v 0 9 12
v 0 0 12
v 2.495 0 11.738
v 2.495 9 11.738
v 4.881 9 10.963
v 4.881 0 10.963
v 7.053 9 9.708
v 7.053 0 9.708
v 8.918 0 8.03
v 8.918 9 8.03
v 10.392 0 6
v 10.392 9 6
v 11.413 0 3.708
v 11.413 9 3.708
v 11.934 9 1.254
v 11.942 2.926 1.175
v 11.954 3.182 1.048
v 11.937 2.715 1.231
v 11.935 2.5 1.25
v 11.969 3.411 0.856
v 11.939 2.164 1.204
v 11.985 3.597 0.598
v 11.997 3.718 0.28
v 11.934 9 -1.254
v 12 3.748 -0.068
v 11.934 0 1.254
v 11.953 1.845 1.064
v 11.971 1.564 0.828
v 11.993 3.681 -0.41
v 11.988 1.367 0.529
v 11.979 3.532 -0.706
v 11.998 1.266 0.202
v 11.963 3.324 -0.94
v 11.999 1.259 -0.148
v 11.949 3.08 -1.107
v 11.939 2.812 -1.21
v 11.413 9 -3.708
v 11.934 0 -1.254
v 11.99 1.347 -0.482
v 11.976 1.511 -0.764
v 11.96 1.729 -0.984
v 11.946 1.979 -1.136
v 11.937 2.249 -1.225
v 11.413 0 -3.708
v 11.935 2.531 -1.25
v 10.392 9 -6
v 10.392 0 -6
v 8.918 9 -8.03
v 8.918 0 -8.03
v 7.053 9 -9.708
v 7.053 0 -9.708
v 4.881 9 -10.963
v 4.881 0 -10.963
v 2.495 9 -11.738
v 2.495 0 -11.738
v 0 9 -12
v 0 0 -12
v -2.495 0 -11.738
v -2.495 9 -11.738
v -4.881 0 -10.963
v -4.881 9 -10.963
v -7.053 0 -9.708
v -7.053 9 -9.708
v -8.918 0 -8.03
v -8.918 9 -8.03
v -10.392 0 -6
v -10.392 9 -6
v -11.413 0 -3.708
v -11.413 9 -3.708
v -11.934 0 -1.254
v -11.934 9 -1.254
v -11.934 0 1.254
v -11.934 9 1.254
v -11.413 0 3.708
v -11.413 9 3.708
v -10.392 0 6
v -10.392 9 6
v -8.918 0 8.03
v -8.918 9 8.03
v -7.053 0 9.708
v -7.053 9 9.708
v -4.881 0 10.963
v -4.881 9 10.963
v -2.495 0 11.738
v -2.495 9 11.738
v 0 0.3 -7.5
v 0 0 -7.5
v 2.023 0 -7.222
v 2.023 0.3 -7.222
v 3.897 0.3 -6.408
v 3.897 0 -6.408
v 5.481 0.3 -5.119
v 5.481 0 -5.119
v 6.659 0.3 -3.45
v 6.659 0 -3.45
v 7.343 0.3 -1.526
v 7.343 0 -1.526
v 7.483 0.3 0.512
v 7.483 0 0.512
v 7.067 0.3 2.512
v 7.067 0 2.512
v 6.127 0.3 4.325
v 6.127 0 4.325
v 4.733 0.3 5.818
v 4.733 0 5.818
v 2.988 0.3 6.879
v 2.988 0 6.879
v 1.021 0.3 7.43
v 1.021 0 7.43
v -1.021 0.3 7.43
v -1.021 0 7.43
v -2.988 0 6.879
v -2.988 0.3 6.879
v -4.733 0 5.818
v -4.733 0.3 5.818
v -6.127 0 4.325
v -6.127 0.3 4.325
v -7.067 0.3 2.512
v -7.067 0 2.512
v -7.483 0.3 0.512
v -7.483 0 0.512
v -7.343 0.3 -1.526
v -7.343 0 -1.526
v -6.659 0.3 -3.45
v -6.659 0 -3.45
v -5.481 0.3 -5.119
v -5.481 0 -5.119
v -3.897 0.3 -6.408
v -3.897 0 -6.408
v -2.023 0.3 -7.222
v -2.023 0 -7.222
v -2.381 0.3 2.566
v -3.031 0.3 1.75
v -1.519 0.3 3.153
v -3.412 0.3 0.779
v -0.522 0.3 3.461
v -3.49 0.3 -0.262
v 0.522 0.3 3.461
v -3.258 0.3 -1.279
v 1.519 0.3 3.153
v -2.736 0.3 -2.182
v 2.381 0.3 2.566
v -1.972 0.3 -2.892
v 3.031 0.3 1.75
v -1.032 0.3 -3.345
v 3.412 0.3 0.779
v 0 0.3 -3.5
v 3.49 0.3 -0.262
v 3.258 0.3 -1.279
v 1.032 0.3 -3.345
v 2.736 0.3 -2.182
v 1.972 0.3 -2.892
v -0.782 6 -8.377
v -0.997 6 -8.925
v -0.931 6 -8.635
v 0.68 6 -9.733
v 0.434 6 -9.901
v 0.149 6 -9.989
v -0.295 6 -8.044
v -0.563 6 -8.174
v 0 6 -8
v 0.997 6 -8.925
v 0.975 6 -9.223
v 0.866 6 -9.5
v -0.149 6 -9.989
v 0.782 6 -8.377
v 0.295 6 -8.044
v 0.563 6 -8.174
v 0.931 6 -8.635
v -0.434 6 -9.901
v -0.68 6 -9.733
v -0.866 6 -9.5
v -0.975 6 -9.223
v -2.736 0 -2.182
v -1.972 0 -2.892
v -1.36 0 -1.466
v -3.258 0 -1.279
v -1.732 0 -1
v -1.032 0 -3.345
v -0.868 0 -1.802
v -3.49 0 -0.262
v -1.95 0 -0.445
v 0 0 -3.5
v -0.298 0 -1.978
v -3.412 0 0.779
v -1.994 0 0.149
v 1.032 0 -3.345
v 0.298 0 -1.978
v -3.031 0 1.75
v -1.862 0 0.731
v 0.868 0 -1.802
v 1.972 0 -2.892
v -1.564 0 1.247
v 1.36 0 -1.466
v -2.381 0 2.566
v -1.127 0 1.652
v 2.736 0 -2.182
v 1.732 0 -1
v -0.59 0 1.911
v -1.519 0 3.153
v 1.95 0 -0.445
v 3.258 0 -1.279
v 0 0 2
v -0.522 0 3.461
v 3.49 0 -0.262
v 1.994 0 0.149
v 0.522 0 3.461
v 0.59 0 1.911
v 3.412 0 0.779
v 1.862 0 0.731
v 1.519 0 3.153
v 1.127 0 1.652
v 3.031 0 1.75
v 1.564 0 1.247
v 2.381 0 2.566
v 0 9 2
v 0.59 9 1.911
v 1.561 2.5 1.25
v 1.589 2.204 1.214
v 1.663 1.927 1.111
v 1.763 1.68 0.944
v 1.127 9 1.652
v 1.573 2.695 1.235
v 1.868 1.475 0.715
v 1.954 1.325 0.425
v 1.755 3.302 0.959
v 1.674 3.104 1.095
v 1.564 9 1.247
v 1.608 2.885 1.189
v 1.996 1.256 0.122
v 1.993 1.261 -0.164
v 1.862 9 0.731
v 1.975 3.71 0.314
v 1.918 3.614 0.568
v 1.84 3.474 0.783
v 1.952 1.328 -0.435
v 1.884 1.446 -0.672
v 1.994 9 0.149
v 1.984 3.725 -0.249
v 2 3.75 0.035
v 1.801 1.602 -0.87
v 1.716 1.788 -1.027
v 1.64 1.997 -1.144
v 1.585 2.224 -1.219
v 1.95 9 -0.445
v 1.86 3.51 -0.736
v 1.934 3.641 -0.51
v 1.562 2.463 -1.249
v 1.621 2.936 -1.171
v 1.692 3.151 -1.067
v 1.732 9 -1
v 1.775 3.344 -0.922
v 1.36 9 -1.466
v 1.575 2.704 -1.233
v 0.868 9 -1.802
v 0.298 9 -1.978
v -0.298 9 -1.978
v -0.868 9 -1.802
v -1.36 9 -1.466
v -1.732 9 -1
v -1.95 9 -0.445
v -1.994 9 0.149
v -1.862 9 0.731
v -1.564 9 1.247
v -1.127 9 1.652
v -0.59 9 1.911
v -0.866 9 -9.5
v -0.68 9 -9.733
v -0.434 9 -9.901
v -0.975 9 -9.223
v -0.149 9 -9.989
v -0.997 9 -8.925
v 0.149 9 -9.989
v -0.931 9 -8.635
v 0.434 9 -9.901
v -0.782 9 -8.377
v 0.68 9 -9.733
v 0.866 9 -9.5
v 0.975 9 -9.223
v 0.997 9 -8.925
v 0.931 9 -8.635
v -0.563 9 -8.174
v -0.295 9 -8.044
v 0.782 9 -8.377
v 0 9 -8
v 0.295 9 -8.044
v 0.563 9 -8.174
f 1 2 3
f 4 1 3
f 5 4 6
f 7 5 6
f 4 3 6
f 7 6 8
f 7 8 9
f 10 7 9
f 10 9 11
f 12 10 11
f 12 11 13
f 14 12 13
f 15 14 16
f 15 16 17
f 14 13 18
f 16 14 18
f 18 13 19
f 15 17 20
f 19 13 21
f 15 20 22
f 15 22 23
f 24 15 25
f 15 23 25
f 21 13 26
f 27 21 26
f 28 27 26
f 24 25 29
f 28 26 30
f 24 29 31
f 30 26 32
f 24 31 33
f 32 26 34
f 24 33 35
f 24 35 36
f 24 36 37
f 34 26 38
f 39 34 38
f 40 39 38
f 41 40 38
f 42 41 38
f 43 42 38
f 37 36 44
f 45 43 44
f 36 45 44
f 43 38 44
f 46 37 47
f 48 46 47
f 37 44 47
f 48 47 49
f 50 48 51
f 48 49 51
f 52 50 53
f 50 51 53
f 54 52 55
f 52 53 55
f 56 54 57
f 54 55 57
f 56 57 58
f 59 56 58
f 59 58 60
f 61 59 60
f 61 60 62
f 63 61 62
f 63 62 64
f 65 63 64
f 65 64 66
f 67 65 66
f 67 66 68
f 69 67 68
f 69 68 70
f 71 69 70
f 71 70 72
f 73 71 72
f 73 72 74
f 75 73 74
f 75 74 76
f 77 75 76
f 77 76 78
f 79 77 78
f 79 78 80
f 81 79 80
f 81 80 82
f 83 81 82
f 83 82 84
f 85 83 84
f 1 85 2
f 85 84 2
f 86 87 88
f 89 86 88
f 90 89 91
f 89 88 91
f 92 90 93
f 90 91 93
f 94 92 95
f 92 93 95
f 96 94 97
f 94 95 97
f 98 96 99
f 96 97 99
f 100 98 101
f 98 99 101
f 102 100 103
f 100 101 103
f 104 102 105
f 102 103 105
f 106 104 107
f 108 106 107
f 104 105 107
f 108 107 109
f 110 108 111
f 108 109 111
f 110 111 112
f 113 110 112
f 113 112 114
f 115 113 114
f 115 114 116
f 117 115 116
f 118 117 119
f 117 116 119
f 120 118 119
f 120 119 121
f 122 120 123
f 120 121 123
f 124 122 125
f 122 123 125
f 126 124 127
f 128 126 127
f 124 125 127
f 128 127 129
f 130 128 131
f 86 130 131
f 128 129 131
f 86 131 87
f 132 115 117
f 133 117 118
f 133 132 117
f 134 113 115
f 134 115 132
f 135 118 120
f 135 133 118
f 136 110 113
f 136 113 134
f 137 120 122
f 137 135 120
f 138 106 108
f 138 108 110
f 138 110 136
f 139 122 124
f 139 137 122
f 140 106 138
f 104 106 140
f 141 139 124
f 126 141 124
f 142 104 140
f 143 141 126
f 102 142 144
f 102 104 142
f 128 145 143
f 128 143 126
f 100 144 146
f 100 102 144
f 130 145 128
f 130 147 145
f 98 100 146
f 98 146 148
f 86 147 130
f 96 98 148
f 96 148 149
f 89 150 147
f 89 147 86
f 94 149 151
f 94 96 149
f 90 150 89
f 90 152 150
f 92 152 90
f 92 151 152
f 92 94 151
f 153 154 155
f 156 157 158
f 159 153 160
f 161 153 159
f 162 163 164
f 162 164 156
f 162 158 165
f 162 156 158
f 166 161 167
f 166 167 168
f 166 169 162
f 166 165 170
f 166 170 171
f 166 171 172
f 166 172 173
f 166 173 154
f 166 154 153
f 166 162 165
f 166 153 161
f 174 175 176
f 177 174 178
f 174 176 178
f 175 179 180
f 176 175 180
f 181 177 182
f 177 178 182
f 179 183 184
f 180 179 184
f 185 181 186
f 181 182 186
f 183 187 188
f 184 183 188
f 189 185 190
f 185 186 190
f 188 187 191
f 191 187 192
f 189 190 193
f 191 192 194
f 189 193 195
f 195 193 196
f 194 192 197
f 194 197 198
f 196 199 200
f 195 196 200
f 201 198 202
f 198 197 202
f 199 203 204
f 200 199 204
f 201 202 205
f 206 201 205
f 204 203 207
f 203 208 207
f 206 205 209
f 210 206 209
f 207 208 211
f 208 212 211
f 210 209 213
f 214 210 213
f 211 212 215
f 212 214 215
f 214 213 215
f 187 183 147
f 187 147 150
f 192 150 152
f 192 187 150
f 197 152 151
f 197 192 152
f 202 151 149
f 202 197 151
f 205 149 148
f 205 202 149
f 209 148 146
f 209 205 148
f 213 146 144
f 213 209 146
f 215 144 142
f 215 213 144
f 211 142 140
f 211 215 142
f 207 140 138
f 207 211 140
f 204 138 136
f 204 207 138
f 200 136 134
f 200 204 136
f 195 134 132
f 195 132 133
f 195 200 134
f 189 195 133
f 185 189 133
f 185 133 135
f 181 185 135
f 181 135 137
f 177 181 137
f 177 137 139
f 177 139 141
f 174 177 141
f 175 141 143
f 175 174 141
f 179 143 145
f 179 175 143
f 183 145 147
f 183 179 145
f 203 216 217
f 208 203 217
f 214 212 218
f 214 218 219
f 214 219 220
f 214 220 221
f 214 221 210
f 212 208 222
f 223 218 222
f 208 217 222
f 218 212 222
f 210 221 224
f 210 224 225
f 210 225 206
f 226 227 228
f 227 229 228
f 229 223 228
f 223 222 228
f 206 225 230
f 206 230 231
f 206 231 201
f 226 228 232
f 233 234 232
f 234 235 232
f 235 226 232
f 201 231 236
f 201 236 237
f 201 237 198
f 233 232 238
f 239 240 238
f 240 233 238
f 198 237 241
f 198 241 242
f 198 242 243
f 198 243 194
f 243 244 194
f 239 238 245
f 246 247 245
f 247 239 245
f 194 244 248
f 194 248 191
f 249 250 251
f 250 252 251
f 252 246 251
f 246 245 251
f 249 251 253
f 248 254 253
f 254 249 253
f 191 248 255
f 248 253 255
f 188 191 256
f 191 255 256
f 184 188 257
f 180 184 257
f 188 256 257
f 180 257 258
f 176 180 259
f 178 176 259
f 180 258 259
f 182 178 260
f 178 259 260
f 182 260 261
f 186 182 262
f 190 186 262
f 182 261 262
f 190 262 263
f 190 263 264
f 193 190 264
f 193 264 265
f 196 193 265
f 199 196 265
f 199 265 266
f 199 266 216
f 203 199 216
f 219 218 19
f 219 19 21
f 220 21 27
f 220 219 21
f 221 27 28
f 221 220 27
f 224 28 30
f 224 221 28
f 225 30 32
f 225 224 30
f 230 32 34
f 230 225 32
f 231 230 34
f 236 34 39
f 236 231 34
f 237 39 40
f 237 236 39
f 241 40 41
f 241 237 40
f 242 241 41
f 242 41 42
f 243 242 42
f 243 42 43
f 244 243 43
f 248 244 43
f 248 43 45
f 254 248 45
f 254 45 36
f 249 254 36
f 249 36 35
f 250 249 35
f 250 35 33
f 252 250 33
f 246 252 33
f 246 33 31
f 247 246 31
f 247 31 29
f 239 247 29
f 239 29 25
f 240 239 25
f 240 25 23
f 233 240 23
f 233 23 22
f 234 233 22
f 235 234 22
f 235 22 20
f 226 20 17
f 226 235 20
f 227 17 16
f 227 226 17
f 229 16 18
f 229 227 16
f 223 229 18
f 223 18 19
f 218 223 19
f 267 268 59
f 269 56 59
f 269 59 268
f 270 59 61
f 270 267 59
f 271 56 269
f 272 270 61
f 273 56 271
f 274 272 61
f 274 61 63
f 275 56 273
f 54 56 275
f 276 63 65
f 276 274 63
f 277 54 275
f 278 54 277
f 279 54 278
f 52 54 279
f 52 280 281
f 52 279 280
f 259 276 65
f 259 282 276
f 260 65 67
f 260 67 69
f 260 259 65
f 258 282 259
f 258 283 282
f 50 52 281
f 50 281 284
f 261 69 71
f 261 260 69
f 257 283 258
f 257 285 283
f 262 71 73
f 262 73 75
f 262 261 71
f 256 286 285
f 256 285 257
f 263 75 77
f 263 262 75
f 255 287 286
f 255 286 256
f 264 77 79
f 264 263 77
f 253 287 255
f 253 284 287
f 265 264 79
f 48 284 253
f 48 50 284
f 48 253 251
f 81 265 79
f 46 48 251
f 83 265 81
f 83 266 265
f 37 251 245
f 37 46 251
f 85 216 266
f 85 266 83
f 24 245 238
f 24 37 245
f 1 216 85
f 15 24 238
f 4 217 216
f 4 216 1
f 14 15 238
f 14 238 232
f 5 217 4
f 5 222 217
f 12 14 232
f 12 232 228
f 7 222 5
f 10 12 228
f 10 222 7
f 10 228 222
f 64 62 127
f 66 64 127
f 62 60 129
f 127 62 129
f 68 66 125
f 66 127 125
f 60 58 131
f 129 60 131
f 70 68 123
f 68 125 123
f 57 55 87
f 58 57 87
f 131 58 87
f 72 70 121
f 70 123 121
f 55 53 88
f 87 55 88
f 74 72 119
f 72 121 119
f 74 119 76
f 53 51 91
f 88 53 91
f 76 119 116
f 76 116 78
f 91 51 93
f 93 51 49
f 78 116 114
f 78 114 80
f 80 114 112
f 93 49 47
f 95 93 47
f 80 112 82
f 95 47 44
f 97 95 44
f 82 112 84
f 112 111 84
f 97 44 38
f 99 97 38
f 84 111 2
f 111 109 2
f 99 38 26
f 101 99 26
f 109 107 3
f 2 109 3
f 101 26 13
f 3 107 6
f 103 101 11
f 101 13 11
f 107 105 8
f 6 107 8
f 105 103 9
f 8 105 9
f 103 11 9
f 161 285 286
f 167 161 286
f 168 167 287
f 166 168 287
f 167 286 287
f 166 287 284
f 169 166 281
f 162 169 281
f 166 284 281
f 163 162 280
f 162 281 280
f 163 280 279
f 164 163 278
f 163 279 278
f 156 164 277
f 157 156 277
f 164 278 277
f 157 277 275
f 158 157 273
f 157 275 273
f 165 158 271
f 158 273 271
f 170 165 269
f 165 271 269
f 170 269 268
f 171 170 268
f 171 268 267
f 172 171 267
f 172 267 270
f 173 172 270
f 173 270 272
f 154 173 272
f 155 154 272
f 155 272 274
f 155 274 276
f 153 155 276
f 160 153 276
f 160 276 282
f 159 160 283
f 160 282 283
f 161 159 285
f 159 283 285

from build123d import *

# Parameters (mm, degrees)
SKETCH_1_R          = 12
EXTRUDE_1_DEPTH     = 9
SKETCH_2_R          = 2
CUT_EXTRUDE_1_DEPTH = 20.209372712
SKETCH_3_R          = 1
CUT_EXTRUDE_2_DEPTH = 3
SKETCH_4_R          = 1.25
CUT_EXTRUDE_3_DEPTH = 13
SKETCH_5_R          = 7.5
SKETCH_5_R_2        = 3.5
CUT_EXTRUDE_4_DEPTH = 0.3


with BuildPart() as part:
    # 草图1 → 凸台-拉伸1 (new body)
    with BuildSketch(Plane(origin=(0, 0, 0), x_dir=(1, 0, 0), z_dir=(0, 1, 0))):
        with Locations(Location((0, 0, 0), (0, 0, 270))):
            Circle(SKETCH_1_R)
    extrude(amount=EXTRUDE_1_DEPTH)

    # 草图2 → 切除-拉伸1 (cut, through all)
    with BuildSketch(Plane(origin=(0, 9, 0), x_dir=(1, 0, 0), z_dir=(0, 1, 0))):
        with Locations(Location((0, 0, 0), (0, 0, 270))):
            Circle(SKETCH_2_R)
    extrude(amount=-CUT_EXTRUDE_1_DEPTH, mode=Mode.SUBTRACT)

    # 草图3 → 切除-拉伸2 (cut)
    with BuildSketch(Plane(origin=(0, 9, 0), x_dir=(1, 0, 0), z_dir=(0, 1, 0))):
        with Locations(Location((0, 9, 0), (0, 0, 270))):
            Circle(SKETCH_3_R)
    extrude(amount=-CUT_EXTRUDE_2_DEPTH, mode=Mode.SUBTRACT)

    # 草图4 → 切除-拉伸3 (cut)
    with BuildSketch(Plane(origin=(0, 0, 0), x_dir=(0, 0, -1), z_dir=(1, 0, 0))):
        with Locations(Location((0, 2.5, 0), (0, 0, 180))):
            Circle(SKETCH_4_R)
    extrude(amount=CUT_EXTRUDE_3_DEPTH, mode=Mode.SUBTRACT)

    # 草图5 → 切除-拉伸4 (cut)
    with BuildSketch(Plane.XZ):
        with Locations(Location((0, 0, 0), (0, 0, 270))):
            Circle(SKETCH_5_R)
        with Locations(Location((0, 0, 0), (0, 0, 270))):
            Circle(SKETCH_5_R_2, mode=Mode.SUBTRACT)
    extrude(amount=-CUT_EXTRUDE_4_DEPTH, mode=Mode.SUBTRACT)


solid = part.part
